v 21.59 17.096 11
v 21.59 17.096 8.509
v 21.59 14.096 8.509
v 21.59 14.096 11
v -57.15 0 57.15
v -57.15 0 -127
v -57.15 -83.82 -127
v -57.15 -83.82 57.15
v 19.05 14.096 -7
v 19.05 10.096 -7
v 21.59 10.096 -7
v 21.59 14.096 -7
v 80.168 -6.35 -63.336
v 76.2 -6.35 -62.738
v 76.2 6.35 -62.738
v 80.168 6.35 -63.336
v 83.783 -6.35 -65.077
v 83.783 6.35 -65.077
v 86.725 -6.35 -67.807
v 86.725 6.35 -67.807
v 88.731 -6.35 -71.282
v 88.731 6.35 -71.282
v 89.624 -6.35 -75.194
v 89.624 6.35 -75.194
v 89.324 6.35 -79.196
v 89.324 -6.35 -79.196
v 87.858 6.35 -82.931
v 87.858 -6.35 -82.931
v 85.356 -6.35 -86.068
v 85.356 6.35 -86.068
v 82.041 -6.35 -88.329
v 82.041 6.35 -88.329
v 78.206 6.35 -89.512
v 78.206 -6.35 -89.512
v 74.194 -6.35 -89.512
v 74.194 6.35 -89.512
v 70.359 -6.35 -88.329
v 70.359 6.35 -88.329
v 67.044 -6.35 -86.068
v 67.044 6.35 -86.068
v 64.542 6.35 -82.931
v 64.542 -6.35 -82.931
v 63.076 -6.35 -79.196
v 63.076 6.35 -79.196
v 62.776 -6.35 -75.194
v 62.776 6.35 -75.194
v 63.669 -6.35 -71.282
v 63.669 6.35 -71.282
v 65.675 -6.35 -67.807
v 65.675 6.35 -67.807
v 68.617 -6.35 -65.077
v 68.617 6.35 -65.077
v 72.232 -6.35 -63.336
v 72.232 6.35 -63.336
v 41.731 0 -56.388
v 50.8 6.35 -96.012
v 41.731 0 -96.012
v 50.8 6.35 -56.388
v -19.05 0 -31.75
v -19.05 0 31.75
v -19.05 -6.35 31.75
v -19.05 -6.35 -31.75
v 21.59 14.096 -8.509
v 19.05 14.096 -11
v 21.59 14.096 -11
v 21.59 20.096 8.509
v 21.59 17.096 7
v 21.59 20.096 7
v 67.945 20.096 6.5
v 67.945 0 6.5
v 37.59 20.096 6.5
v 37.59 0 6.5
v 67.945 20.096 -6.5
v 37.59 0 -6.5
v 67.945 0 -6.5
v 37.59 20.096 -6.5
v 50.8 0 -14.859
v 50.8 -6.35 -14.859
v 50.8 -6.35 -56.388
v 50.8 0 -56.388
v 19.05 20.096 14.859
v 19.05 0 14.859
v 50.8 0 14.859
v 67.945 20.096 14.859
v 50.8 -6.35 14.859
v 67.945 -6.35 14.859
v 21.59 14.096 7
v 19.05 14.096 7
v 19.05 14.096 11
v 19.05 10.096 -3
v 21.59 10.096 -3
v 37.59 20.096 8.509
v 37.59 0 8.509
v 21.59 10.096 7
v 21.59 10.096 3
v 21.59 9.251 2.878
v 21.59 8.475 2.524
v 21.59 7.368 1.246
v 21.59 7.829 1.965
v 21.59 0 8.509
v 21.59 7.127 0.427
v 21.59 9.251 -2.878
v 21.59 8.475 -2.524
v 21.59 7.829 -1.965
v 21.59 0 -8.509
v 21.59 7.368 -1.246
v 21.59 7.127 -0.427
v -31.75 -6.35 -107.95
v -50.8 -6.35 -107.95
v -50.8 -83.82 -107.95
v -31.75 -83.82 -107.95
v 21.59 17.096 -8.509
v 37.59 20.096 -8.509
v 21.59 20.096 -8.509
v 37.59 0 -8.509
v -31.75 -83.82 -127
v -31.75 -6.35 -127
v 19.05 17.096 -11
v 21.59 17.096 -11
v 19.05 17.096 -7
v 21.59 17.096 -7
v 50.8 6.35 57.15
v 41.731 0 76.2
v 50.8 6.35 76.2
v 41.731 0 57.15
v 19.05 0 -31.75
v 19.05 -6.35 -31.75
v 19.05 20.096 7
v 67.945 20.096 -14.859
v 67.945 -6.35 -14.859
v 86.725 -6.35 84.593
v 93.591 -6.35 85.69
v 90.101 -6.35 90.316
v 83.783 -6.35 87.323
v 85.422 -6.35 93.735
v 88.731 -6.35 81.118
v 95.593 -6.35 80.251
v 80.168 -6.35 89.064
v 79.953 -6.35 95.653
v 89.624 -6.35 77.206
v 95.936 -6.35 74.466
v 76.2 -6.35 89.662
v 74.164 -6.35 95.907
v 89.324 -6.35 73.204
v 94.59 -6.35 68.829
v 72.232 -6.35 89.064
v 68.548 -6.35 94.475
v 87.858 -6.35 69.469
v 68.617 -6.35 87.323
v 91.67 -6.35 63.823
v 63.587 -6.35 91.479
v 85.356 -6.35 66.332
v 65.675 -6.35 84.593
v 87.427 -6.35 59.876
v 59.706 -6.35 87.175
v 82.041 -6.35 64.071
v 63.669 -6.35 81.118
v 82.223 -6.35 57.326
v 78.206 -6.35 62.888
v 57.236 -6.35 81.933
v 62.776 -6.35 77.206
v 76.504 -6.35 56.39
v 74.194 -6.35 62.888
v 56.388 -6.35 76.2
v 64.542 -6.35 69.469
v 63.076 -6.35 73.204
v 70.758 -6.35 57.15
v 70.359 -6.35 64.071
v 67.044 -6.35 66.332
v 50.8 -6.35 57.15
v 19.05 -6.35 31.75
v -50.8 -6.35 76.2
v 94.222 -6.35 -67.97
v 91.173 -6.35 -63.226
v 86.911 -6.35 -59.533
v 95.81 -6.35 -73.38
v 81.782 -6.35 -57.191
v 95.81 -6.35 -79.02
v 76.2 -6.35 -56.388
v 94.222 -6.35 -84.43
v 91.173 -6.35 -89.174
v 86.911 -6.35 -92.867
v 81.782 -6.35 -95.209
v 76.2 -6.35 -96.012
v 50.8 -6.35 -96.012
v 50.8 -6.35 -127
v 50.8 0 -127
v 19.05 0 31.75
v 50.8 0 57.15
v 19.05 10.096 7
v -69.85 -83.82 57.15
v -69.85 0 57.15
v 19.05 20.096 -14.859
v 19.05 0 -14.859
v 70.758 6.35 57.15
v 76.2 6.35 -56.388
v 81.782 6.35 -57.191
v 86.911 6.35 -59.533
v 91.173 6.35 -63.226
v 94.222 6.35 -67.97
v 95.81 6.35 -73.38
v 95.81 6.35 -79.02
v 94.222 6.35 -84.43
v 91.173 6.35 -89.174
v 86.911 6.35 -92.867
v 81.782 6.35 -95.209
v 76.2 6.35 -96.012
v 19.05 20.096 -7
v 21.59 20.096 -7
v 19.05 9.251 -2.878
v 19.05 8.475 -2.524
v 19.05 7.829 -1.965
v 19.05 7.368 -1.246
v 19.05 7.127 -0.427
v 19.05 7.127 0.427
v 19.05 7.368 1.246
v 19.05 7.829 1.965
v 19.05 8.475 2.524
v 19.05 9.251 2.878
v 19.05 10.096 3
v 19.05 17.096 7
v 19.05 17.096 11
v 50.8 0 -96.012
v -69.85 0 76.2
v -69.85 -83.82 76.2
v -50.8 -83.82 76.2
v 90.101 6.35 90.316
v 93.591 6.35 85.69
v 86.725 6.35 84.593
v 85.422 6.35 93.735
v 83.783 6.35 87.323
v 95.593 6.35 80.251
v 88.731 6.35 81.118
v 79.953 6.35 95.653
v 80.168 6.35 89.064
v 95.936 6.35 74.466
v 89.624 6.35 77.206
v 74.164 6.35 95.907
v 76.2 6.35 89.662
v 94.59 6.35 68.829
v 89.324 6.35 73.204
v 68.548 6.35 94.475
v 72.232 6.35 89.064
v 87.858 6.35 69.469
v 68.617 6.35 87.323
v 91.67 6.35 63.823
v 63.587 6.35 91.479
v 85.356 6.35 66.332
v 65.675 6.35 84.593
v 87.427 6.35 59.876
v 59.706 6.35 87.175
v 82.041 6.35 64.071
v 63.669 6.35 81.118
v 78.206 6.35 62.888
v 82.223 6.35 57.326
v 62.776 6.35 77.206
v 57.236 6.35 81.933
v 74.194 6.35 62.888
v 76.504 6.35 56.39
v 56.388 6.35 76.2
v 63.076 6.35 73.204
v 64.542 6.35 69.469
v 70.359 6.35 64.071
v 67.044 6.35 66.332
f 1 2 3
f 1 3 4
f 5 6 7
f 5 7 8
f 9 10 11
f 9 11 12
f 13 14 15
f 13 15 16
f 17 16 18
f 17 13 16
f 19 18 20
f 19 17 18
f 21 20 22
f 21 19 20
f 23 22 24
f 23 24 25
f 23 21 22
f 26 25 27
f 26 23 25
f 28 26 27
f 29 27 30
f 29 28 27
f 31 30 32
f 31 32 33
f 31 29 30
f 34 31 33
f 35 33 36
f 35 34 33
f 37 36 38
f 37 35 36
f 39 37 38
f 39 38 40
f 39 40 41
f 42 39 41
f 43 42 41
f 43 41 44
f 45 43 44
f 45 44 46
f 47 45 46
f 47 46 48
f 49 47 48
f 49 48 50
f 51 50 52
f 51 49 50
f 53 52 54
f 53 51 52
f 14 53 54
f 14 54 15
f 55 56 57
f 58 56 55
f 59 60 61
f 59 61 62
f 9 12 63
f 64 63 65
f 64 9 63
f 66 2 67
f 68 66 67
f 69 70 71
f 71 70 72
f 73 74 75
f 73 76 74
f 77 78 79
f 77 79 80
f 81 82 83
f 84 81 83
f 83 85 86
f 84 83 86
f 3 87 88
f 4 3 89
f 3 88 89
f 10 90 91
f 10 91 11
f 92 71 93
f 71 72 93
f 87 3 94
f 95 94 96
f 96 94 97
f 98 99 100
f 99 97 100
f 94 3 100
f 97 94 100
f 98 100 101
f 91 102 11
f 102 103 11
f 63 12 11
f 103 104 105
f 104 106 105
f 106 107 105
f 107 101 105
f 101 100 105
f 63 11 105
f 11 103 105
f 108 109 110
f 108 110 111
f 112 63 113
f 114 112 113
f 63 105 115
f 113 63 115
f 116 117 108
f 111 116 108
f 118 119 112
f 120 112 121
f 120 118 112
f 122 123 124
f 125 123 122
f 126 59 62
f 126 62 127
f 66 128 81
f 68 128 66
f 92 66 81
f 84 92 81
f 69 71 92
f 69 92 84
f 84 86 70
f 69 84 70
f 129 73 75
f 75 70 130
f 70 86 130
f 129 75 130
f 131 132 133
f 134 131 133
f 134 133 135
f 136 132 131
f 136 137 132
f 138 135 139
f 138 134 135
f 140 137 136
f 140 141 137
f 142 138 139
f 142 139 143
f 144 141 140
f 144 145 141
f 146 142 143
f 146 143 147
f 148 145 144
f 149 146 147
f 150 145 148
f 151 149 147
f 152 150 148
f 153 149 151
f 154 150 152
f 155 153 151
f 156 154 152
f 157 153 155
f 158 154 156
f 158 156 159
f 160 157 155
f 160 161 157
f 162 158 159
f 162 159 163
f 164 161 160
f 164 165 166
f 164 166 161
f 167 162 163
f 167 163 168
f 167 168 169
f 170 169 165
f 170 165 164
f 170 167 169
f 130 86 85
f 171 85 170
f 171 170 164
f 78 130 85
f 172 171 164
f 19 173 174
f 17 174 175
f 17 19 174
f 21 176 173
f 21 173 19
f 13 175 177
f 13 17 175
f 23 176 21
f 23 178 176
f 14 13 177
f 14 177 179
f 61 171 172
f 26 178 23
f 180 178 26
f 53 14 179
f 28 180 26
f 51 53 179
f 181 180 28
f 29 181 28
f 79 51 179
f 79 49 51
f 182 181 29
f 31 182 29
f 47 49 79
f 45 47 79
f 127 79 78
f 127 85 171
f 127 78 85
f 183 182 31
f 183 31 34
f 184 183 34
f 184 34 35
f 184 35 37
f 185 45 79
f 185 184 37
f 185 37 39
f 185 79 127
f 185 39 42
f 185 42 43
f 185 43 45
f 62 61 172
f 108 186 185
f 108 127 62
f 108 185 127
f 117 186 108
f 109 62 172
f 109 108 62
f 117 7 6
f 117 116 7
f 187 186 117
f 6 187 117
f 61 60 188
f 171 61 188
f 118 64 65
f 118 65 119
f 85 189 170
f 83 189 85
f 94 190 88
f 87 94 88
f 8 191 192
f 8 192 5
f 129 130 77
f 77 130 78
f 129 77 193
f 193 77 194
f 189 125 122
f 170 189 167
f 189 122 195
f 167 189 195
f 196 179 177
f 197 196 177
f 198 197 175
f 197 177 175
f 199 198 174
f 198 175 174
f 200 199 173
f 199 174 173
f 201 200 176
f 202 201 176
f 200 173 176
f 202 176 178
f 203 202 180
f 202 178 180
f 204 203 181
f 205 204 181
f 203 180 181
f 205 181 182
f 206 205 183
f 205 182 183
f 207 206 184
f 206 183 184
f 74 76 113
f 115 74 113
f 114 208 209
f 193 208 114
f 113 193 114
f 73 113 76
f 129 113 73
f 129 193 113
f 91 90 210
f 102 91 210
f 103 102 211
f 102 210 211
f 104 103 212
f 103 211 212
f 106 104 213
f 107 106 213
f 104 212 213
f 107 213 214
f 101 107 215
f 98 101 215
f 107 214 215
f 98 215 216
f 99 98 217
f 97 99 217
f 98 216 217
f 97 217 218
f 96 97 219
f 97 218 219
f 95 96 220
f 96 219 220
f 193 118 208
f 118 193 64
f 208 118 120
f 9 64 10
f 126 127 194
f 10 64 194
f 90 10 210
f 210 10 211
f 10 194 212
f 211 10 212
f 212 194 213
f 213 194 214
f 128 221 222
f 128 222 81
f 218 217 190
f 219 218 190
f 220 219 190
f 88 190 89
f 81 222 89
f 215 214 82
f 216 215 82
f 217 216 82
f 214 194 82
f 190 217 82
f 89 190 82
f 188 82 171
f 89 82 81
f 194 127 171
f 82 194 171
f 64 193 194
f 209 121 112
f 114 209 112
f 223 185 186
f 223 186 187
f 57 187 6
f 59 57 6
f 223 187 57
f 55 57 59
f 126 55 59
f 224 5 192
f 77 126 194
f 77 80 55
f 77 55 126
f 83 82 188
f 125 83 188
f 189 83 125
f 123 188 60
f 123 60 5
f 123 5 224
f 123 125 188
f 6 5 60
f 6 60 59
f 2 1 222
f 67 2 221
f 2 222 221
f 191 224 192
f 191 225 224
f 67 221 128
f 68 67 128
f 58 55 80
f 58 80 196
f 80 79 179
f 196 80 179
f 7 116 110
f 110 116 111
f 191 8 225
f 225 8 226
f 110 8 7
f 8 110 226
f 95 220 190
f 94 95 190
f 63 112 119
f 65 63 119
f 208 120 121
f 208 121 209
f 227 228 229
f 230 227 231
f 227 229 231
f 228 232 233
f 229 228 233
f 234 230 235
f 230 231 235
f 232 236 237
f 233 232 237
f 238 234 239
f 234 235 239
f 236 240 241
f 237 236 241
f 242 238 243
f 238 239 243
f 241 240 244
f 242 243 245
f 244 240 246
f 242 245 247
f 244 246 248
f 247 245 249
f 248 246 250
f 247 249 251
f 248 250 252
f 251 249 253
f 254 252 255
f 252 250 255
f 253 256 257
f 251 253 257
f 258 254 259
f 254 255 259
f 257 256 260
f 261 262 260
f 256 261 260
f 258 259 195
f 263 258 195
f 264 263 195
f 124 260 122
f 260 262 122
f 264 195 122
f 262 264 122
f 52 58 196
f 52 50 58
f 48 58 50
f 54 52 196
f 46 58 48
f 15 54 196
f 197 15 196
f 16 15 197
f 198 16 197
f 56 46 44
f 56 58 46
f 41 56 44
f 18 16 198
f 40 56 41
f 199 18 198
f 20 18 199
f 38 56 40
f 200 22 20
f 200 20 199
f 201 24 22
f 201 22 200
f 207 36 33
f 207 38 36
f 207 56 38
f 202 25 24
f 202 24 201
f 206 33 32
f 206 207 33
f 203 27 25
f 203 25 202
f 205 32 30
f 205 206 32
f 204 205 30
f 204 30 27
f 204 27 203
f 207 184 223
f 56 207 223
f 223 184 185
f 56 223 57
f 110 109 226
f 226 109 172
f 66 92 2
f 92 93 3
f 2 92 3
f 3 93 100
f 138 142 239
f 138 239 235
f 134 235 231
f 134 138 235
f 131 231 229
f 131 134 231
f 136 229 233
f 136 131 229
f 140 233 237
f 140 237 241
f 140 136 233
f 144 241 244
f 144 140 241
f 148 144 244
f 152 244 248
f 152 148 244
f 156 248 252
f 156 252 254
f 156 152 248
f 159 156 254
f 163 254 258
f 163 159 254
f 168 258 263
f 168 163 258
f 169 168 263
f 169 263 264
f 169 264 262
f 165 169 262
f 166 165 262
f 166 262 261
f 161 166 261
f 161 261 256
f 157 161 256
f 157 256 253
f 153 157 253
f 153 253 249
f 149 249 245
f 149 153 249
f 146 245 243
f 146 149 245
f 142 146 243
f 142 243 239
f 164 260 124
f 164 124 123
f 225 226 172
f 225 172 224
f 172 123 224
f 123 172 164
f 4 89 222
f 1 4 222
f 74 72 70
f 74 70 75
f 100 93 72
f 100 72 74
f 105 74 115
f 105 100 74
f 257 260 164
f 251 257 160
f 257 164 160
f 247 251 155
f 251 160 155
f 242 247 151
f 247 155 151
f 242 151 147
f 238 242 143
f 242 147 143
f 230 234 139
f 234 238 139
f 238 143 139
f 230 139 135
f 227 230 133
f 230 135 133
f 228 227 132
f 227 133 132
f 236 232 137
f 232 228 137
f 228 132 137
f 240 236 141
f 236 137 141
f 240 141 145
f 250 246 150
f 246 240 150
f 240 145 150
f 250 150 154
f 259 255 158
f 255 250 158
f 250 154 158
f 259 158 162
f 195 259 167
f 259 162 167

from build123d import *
from OCP.BRepFilletAPI import BRepFilletAPI_MakeChamfer

# Parameters (mm, degrees)
SKETCH1_W                 = 101.6
SKETCH1_H                 = 152.4
BOSS_EXTRUDE1_DEPTH       = 6.35
SKETCH2_W                 = 38.1
SKETCH2_H                 = 63.5
CUT_EXTRUDE1_DEPTH        = 92.800885072
BOSS_EXTRUDE3_DEPTH       = 10.0965
BOSS_EXTRUDE3_DEPTH_BACK  = 6.35
CUT_EXTRUDE2_REACH        = 105.862
SKETCH6_R                 = 3
SKETCH7_W                 = 24.005
SKETCH7_H                 = 2.009
BOSS_EXTRUDE4_DEPTH       = 16.4465
BOSS_EXTRUDE5_REACH       = 129.401
SKETCH10_W                = 13
SKETCH10_H                = 6.35
CUT_EXTRUDE3_REACH        = 138.165
SKETCH11_W                = 13
SKETCH11_H                = 10.0965
BOSS_EXTRUDE6_DEPTH       = 10
CUT_EXTRUDE4_DEPTH        = 2.54
SKETCH14_W                = 101.6
SKETCH14_H                = 6.35
BOSS_EXTRUDE7_DEPTH       = 50.8
SKETCH15_W                = 19.05
SKETCH15_H                = 19.05
BOSS_EXTRUDE8_DEPTH       = 77.47
SKETCH16_W                = 19.05
SKETCH16_H                = 19.05
BOSS_EXTRUDE9_DEPTH       = 6.35
SKETCH17_W                = 184.15
SKETCH17_H                = 83.82
BOSS_EXTRUDE10_DEPTH      = 6.35
BOSS_EXTRUDE11_DEPTH      = 6.35
BOSS_EXTRUDE11_DEPTH_BACK = 6.35
SKETCH18_R                = 19.812
SKETCH18_R_2              = 13.462
SKETCH21_W                = 7.62
SKETCH21_H                = 39.624
BOSS_EXTRUDE13_DEPTH      = 12.7
CHAMFER1_SIZE             = 6.35
CHAMFER1_SIZE_2           = 9.068739843


with BuildPart() as part:
    # Sketch1 → Boss-Extrude1 (new body)
    with BuildSketch(Plane(origin=(0, 0, 0), x_dir=(1, 0, 0), z_dir=(0, 1, 0))):
        Rectangle(SKETCH1_W, SKETCH1_H)
    extrude(amount=-BOSS_EXTRUDE1_DEPTH)

    # Sketch2 → Cut-Extrude1 (cut, through all)
    with BuildSketch(Plane(origin=(0, 0, 0), x_dir=(1, 0, 0), z_dir=(0, 1, 0))):
        Rectangle(SKETCH2_W, SKETCH2_H)
    extrude(amount=-CUT_EXTRUDE1_DEPTH, mode=Mode.SUBTRACT)

    # Sketch4 → Boss-Extrude3 (add, two sides: drawn at the far end of the back side and taken through both)
    with BuildSketch(Plane(origin=(0, 0, 0), x_dir=(1, 0, 0), z_dir=(0, 1, 0)).offset(-BOSS_EXTRUDE3_DEPTH_BACK)):
        Polygon((61.595, -8.509), (50.8, -8.509), (50.8, -14.859), (67.945, -14.859), (67.945, 14.859), (50.8, 14.859), (50.8, 8.509), (61.595, 8.509), align=None)
        Polygon((50.8, -8.509), (21.59, -8.509), (21.59, 8.509), (50.8, 8.509), (50.8, 14.859), (19.05, 14.859), (19.05, -14.859), (50.8, -14.859), align=None)
    extrude(amount=BOSS_EXTRUDE3_DEPTH + BOSS_EXTRUDE3_DEPTH_BACK)

    # Sketch6 → Cut-Extrude2 (cut, up to next)
    with BuildSketch(Plane.ZY.offset(-19.05), mode=Mode.PRIVATE) as cut_extrude2_sk1:
        with Locations((0, 10.0965)):
            Circle(SKETCH6_R)
    cut_extrude2_tool1 = extrude(cut_extrude2_sk1.sketch, amount=-CUT_EXTRUDE2_REACH, mode=Mode.PRIVATE) & part.part
    add(cut_extrude2_tool1.solids().sort_by_distance((19.05, 10.0965, 0))[0], mode=Mode.SUBTRACT)

    # Sketch7 → Boss-Extrude4 (add, through all)
    with BuildSketch(Plane(origin=(0, 10.0965, 0), x_dir=(1, 0, 0), z_dir=(0, 1, 0))):
        with Locations((49.5925, 7.5045)):
            Rectangle(SKETCH7_W, SKETCH7_H)
        with Locations((49.5925, -7.5045)):
            Rectangle(SKETCH7_W, SKETCH7_H)
    extrude(amount=-BOSS_EXTRUDE4_DEPTH)

    # Sketch10 → Boss-Extrude5 (add, up to next)
    with BuildSketch(Plane(origin=(50.8, 0, 0), x_dir=(0, 0, -1), z_dir=(1, 0, 0)), mode=Mode.PRIVATE) as boss_extrude5_sk1:
        with Locations((0, -3.175)):
            Rectangle(SKETCH10_W, SKETCH10_H)
    boss_extrude5_tool1 = extrude(boss_extrude5_sk1.sketch, amount=BOSS_EXTRUDE5_REACH, mode=Mode.PRIVATE) - part.part
    add(boss_extrude5_tool1.solids().sort_by_distance((50.8, -3.175, 0))[0])

    # Sketch11 → Cut-Extrude3 (cut, up to next)
    with BuildSketch(Plane.ZY.offset(-61.595), mode=Mode.PRIVATE) as cut_extrude3_sk1:
        with Locations((0, 5.04825)):
            Rectangle(SKETCH11_W, SKETCH11_H)
    cut_extrude3_tool1 = extrude(cut_extrude3_sk1.sketch, amount=-CUT_EXTRUDE3_REACH, mode=Mode.PRIVATE) & part.part
    add(cut_extrude3_tool1.solids().sort_by_distance((61.595, 5.04825, 0))[0], mode=Mode.SUBTRACT)

    # Sketch12 → Boss-Extrude6 (add)
    with BuildSketch(Plane(origin=(0, 10.0965, 0), x_dir=(1, 0, 0), z_dir=(0, 1, 0))):
        Polygon((67.945, -14.859), (67.945, -6.5), (37.59, -6.5), (37.59, -8.509), (21.59, -8.509), (21.59, -3), (19.05, -3), (19.05, -14.859), align=None)
        Polygon((37.59, 6.5), (67.945, 6.5), (67.945, 14.859), (19.05, 14.859), (19.05, 3), (21.59, 3), (21.59, 8.509), (37.59, 8.509), align=None)
    extrude(amount=BOSS_EXTRUDE6_DEPTH)

    # Sketch13 → Cut-Extrude4 (cut)
    with BuildSketch(Plane.ZY.offset(-19.05)):
        Polygon((3, 10.0965), (7, 10.0965), (7, 14.0965), (11, 14.0965), (11, 17.0965), (7, 17.0965), (7, 20.0965), (3, 20.0965), align=None)
    cut_extrude4 = extrude(amount=-CUT_EXTRUDE4_DEPTH, mode=Mode.SUBTRACT)

    # Mirror1: Cut-Extrude4 across plane
    add(cut_extrude4.mirror(Plane.XY), mode=Mode.SUBTRACT)

    # Sketch14 → Boss-Extrude7 (add)
    with BuildSketch(Plane(origin=(0, 0, -76.2), x_dir=(-1, 0, 0), z_dir=(0, 0, -1))):
        with Locations((0, -3.175)):
            Rectangle(SKETCH14_W, SKETCH14_H)
    extrude(amount=BOSS_EXTRUDE7_DEPTH)

    # Sketch15 → Boss-Extrude8 (add)
    with BuildSketch(Plane.XZ.offset(6.35)):
        with Locations((-60.325, 66.675)):
            Rectangle(SKETCH15_W, SKETCH15_H)
        with Locations((-41.275, -117.475)):
            Rectangle(SKETCH15_W, SKETCH15_H)
    extrude(amount=BOSS_EXTRUDE8_DEPTH)


with BuildPart() as boss_extrude8_piece_1:
    # of the separate pieces the step leaves, piece 1, a body of its own (boss_extrude8_pieces)
    add(part.part.solids().sort_by_distance((-50.8, 0, 76.2))[0])



with BuildPart() as boss_extrude8_piece_2:
    # of the separate pieces the step leaves, piece 2, a body of its own (boss_extrude8_pieces)
    add(part.part.solids().sort_by_distance((-50.8, -83.82, 76.2))[0])


with BuildPart() as boss_extrude8_piece_1_1:
    add(boss_extrude8_piece_1.part)

    add(boss_extrude8_piece_2.part)  # Boss-Extrude9 merges Boss-Extrude8 piece 2
    # Sketch16 → Boss-Extrude9 (add)
    with BuildSketch(Plane(origin=(0, -6.35, 0), x_dir=(1, 0, 0), z_dir=(0, 1, 0))):
        with Locations((-60.325, -66.675)):
            Rectangle(SKETCH16_W, SKETCH16_H)
    extrude(amount=BOSS_EXTRUDE9_DEPTH)

    # Sketch17 → Boss-Extrude10 (add)
    with BuildSketch(Plane.ZY.offset(50.8)):
        with Locations((-34.925, -41.91)):
            Rectangle(SKETCH17_W, SKETCH17_H)
    extrude(amount=BOSS_EXTRUDE10_DEPTH)

    # Sketch18 → Boss-Extrude11 (add, two sides: drawn at the far end of the back side and taken through both)
    # profile 1 of 2: a face of its own
    with BuildSketch(Plane(origin=(0, 0, 0), x_dir=(1, 0, 0), z_dir=(0, 1, 0)).offset(-BOSS_EXTRUDE11_DEPTH_BACK)):
        with Locations(Location((76.2, -76.2, 0), (0, 0, 270))):
            Circle(SKETCH18_R)
        with Locations(Location((76.2, -76.2, 0), (0, 0, 270))):
            Circle(SKETCH18_R_2, mode=Mode.SUBTRACT)
    # profile 2 of 2: a face of its own
    with BuildSketch(Plane(origin=(0, 0, 0), x_dir=(1, 0, 0), z_dir=(0, 1, 0)).offset(-BOSS_EXTRUDE11_DEPTH_BACK)):
        with BuildLine():
            Line((76.2, 96.012), (50.8, 96.012))
            Line((50.8, 96.012), (50.8, 56.388))
            Line((50.8, 56.388), (76.2, 56.388))
            ThreePointArc((76.2, 56.388), (96.012, 76.2), (76.2, 96.012))
        make_face()
        with Locations(Location((76.2, 76.2, 0), (0, 0, 270))):
            Circle(SKETCH18_R_2, mode=Mode.SUBTRACT)
    extrude(amount=BOSS_EXTRUDE11_DEPTH + BOSS_EXTRUDE11_DEPTH_BACK)


with BuildPart() as boss_extrude11_piece_1:
    # of the separate pieces the step leaves, piece 1, a body of its own (boss_extrude11_pieces)
    add(boss_extrude8_piece_1_1.part.solids().sort_by_distance((-50.8, -6.35, 76.2))[0])



with BuildPart() as boss_extrude11_piece_2:
    # of the separate pieces the step leaves, piece 2, a body of its own (boss_extrude11_pieces)
    add(boss_extrude8_piece_1_1.part.solids().sort_by_distance((76.2, 0, 96.012))[0])


with BuildPart() as boss_extrude11_piece_1_1:
    add(boss_extrude11_piece_1.part)

    add(boss_extrude11_piece_2.part)  # Boss-Extrude13 merges Boss-Extrude11 piece 2
    # Sketch21 → Boss-Extrude13 (add)
    with BuildSketch(Plane(origin=(0, 6.35, 0), x_dir=(1, 0, 0), z_dir=(0, 1, 0))):
        with BuildLine():
            Line((56.388, -76.2), (50.8, -76.2))
            Line((50.8, -76.2), (50.8, -57.15))
            Line((50.8, -57.15), (70.758231537, -57.15))
            ThreePointArc((70.758231537, -57.15), (60.383431776, -64.268884645), (56.388, -76.2))
        make_face()
        with Locations((54.61, 76.2)):
            Rectangle(SKETCH21_W, SKETCH21_H)
    extrude(amount=-BOSS_EXTRUDE13_DEPTH)

    # Chamfer1
    chamfer1_edges_1 = [boss_extrude11_piece_1_1.edges().sort_by_distance(p)[0] for p in [
        (50.8, 0, 66.675),
    ]]
    chamfer1_side_1 = [boss_extrude11_piece_1_1.faces().sort_by_distance(p)[0] for p in [
        (50.8, 0.127, 66.675),
    ]]
    chamfer1_edges_2 = [boss_extrude11_piece_1_1.edges().sort_by_distance(p)[0] for p in [
        (50.8, 0, -76.2),
    ]]
    chamfer1_side_2 = [boss_extrude11_piece_1_1.faces().sort_by_distance(p)[0] for p in [
        (50.673, 0, -76.2),
    ]]
    chamfer1 = BRepFilletAPI_MakeChamfer(boss_extrude11_piece_1_1.part.solid().wrapped)
    for e in chamfer1_edges_1:
        chamfer1.Add(CHAMFER1_SIZE - 0.0001, CHAMFER1_SIZE_2 - 0.0001, e.wrapped, chamfer1_side_1[0].wrapped)
    for e in chamfer1_edges_2:
        chamfer1.Add(CHAMFER1_SIZE_2 - 0.0001, CHAMFER1_SIZE - 0.0001, e.wrapped, chamfer1_side_2[0].wrapped)
    add(Compound.cast(chamfer1.Shape()), mode=Mode.REPLACE)  # a hair under: the kernel refuses the full size


solid = boss_extrude11_piece_1_1.part
